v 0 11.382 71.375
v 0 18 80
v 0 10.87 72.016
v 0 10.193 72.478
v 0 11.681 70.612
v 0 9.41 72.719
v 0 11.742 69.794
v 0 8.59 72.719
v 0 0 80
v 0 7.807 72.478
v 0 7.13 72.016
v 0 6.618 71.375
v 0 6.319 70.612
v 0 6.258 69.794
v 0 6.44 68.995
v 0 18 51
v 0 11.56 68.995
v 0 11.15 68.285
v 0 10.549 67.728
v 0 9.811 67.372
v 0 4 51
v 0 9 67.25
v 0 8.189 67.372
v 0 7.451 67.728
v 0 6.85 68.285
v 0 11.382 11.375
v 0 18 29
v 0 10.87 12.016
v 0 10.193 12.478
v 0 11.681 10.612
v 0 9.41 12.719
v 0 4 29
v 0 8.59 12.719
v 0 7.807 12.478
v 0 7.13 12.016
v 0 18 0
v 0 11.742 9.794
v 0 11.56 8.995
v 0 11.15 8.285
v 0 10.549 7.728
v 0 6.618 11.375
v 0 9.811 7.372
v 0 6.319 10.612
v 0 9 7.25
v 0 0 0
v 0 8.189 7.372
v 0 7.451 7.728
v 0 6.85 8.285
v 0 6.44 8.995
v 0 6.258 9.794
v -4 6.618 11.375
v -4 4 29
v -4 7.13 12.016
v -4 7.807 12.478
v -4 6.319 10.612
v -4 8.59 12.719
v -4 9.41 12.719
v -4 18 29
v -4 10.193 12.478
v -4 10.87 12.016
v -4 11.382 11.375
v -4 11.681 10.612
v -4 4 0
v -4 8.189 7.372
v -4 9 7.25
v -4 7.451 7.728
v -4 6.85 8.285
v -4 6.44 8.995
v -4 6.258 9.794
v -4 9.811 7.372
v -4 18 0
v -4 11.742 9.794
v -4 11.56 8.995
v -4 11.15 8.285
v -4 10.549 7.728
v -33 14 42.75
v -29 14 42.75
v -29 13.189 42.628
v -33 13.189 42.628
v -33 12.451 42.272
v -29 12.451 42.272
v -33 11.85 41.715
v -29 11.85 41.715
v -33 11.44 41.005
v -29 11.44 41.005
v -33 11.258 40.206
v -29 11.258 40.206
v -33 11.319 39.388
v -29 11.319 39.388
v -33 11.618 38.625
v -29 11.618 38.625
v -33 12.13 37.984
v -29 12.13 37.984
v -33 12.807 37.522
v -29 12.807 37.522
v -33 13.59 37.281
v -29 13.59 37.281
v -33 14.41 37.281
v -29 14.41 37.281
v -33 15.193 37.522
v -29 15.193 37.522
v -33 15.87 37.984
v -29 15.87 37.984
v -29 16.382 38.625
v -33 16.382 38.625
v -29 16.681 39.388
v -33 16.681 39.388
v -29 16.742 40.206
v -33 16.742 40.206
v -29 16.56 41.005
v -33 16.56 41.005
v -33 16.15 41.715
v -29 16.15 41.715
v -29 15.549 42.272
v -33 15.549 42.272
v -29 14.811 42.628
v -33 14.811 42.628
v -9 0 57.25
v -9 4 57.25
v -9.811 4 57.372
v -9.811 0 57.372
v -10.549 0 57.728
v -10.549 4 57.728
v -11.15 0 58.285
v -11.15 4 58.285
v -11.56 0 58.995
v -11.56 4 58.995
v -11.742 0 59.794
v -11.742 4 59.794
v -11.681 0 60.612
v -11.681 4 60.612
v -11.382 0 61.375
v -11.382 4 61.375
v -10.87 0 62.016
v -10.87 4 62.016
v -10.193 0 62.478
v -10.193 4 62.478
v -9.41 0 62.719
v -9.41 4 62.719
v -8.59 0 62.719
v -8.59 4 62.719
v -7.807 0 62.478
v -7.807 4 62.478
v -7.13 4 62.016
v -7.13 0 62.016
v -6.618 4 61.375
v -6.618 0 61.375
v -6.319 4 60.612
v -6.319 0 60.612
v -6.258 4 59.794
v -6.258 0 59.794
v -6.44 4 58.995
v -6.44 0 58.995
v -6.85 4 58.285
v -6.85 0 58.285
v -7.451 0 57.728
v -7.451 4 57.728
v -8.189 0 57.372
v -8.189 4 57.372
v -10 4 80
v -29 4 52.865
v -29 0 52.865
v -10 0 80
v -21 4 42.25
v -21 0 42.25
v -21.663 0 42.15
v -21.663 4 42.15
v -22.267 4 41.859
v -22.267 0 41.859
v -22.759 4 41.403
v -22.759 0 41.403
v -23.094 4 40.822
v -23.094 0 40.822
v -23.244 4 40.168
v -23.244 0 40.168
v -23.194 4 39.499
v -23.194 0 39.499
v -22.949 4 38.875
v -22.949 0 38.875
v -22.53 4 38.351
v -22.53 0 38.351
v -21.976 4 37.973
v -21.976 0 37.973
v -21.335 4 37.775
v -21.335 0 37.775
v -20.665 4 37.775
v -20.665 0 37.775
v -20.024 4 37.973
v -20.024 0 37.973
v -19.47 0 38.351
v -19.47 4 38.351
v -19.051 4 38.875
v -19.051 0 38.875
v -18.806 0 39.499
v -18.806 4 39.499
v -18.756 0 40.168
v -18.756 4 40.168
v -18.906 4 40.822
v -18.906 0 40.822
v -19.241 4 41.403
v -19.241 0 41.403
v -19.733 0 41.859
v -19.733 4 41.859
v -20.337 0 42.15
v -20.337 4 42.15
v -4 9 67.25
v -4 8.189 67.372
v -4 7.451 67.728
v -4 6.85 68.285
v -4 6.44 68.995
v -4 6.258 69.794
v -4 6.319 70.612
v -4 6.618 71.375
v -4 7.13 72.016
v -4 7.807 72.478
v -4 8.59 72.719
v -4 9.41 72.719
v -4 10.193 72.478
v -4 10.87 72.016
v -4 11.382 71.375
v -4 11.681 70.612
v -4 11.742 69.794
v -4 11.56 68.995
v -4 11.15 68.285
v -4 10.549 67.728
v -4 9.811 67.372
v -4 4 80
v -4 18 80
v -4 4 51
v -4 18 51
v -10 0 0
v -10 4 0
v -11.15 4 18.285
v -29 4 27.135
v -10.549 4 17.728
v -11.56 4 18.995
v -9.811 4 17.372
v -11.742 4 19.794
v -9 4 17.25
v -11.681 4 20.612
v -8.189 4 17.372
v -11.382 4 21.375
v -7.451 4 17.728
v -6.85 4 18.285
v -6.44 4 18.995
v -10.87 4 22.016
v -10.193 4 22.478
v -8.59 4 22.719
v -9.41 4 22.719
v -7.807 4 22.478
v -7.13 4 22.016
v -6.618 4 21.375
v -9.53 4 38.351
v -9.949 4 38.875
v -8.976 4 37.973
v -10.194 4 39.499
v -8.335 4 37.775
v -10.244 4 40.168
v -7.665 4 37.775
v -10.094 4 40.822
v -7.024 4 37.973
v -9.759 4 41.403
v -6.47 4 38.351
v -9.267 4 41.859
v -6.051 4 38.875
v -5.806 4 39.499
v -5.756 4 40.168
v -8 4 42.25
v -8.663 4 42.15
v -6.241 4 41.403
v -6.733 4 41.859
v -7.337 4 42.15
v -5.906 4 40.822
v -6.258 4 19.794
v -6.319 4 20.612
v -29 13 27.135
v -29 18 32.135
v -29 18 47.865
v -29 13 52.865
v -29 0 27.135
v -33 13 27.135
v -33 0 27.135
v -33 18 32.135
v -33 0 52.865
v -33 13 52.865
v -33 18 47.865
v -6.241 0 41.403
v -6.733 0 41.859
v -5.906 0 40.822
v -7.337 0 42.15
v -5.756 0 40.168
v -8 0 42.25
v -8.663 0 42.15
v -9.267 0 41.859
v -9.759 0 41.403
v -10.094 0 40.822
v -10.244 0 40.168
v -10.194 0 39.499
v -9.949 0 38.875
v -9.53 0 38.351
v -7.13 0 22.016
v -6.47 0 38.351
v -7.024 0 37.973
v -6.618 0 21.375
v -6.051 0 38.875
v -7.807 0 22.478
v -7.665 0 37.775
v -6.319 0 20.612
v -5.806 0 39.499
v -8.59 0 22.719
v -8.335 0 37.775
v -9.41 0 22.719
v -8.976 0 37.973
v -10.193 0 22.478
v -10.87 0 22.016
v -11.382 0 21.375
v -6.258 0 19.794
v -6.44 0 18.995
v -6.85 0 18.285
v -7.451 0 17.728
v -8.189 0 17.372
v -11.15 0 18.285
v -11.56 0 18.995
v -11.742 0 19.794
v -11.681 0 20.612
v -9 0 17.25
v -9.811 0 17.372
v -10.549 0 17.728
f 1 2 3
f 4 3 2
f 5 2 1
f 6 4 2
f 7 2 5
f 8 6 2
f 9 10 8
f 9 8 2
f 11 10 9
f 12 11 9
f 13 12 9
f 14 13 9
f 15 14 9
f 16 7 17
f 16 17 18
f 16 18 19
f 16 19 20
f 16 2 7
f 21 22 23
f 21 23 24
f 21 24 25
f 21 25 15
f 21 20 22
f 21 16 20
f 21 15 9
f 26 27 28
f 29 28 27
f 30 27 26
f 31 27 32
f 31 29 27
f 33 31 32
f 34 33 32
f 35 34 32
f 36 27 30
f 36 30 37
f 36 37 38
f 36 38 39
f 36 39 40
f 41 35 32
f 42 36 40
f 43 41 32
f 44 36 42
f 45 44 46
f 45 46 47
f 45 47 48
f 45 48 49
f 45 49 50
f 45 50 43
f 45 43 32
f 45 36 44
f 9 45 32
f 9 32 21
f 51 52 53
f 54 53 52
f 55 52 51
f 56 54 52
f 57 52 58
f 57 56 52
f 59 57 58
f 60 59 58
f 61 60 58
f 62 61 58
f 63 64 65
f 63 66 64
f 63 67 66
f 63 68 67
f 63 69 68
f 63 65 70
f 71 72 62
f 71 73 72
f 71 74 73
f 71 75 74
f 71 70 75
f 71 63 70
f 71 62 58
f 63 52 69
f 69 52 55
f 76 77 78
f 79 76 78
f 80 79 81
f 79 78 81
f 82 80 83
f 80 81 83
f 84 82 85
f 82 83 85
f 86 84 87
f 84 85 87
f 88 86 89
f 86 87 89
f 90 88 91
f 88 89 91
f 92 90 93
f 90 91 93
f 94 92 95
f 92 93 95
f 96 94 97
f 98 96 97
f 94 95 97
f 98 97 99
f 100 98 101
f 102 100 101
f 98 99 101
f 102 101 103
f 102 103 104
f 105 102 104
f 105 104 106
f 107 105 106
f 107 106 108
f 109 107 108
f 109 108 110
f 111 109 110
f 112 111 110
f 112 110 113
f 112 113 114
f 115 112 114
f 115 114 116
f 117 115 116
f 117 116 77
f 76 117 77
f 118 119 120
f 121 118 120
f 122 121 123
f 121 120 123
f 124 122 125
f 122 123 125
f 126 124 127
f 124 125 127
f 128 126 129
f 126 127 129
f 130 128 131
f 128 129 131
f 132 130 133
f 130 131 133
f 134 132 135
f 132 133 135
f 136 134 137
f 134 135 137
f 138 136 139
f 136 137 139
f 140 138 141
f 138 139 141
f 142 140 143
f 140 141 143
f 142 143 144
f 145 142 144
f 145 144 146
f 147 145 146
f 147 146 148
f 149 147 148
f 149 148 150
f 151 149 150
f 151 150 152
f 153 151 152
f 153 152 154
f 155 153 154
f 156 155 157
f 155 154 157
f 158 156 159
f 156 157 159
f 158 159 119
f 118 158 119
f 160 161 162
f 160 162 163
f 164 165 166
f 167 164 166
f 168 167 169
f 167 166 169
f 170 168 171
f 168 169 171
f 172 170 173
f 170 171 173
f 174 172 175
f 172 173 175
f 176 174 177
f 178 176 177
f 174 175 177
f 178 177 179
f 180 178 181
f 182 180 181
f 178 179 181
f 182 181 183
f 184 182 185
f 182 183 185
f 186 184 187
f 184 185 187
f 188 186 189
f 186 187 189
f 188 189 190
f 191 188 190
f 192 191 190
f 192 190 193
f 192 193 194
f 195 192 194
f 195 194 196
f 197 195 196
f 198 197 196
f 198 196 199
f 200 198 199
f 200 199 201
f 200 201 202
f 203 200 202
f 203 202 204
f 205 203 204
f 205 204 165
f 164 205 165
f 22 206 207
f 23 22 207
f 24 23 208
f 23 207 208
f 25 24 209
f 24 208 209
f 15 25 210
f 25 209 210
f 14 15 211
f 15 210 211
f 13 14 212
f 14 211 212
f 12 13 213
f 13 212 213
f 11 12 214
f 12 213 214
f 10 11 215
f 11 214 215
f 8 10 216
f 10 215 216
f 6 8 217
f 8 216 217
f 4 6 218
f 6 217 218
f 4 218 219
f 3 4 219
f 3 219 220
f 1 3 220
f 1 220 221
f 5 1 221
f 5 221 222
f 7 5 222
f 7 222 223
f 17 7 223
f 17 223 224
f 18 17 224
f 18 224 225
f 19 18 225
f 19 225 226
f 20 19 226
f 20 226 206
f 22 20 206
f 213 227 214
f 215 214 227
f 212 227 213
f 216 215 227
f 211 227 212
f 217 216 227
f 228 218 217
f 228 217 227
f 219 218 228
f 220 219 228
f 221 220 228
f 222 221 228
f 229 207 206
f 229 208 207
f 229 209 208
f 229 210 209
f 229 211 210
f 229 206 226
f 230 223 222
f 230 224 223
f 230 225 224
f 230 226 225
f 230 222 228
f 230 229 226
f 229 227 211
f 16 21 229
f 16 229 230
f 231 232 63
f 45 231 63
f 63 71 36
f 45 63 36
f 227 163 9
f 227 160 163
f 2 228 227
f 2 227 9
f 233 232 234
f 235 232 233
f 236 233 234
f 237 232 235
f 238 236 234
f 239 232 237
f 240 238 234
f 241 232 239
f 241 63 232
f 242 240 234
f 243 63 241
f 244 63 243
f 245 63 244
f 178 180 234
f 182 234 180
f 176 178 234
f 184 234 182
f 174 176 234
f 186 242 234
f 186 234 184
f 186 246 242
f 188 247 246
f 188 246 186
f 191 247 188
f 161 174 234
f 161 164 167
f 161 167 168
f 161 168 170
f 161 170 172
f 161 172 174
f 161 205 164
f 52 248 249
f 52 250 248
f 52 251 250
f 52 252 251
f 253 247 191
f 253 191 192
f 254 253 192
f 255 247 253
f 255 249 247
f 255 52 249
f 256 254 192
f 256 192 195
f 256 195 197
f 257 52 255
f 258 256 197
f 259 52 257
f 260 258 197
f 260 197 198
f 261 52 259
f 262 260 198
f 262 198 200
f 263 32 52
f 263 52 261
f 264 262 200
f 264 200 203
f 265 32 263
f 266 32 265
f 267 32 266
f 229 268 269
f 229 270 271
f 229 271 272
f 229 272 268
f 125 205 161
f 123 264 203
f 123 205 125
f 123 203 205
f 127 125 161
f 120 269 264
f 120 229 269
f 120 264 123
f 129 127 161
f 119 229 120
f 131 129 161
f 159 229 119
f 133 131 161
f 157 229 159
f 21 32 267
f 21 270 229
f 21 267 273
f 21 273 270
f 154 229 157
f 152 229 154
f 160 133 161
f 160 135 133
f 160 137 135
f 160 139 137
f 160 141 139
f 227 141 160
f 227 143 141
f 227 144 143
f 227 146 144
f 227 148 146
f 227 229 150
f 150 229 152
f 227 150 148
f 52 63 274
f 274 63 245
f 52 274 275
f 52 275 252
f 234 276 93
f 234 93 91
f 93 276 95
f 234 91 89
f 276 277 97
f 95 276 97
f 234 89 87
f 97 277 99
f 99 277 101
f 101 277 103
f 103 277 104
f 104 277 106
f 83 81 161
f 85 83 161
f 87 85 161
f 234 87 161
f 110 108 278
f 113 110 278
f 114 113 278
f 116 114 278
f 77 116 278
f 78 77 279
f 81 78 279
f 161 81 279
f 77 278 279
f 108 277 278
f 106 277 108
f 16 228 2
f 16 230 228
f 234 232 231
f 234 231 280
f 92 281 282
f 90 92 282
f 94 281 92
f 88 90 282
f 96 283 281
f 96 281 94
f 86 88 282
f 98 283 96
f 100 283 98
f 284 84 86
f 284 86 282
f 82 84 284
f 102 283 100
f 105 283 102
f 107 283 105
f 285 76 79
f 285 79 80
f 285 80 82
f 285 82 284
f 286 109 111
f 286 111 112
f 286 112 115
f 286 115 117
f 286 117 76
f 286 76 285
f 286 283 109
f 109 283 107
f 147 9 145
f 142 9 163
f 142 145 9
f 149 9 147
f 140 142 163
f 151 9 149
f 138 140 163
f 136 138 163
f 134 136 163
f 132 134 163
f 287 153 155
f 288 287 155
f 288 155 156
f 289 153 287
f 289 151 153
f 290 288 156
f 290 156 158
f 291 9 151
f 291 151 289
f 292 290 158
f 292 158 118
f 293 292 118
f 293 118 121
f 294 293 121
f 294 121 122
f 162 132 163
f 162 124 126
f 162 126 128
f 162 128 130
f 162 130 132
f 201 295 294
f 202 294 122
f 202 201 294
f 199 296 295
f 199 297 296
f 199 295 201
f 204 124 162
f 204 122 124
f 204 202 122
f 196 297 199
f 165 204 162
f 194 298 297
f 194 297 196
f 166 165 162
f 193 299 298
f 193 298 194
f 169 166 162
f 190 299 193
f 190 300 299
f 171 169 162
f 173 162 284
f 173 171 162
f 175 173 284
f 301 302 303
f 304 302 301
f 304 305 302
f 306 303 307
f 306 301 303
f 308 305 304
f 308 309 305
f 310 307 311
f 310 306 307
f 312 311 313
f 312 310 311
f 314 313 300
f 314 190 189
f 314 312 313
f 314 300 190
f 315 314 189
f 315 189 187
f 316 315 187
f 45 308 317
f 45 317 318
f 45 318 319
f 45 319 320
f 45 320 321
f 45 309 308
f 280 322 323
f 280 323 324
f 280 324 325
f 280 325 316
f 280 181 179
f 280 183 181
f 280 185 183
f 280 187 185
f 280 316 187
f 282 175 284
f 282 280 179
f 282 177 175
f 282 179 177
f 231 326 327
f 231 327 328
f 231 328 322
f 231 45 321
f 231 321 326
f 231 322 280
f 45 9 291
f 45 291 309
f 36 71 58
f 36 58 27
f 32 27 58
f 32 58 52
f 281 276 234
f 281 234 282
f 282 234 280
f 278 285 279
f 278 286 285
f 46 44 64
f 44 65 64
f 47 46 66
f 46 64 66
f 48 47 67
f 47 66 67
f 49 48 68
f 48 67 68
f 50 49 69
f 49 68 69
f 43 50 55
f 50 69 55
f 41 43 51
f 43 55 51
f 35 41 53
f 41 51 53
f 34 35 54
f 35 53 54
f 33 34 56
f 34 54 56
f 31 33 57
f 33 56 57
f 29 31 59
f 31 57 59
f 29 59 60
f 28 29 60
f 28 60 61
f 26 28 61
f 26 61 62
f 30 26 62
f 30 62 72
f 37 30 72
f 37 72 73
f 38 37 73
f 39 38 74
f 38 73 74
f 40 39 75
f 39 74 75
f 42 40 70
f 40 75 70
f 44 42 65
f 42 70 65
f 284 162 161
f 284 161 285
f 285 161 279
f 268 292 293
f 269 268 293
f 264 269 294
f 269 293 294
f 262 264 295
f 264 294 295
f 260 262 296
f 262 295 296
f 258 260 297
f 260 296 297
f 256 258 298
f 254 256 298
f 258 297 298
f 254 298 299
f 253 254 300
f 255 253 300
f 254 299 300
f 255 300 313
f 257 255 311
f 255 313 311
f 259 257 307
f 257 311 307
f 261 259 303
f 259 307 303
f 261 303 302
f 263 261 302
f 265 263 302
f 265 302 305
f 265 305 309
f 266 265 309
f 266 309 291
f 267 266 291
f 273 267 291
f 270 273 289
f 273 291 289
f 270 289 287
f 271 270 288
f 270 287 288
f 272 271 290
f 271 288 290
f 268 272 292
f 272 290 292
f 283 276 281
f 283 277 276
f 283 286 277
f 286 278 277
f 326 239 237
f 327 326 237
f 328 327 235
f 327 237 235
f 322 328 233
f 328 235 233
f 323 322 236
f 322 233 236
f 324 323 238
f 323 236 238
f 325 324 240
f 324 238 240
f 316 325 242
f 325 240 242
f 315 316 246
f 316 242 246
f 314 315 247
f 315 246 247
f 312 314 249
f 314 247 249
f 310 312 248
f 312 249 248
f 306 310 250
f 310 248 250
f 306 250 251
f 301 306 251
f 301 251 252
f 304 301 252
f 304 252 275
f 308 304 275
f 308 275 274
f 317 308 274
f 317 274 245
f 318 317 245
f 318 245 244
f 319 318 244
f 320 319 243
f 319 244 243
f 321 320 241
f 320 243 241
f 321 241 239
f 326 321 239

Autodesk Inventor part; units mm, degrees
ref_plane "YZ Plane" through (0, 0, 0) normal (1, 0, 0) x (0, 1, 0)
ref_plane "XZ Plane" through (0, 0, 0) normal (0, 1, 0) x (-1, 0, 0)
ref_plane "XY Plane" through (0, 0, 0) normal (0, 0, 1) x (1, 0, 0)
sketch "Sketch1" plane through (0, 0, 0) normal (0, 0, 1) x (1, 0, 0)
  line L0 (0, 0) -> (-29, 0)
  line L1 (-29, 0) -> (-29, 4)
  line L2 (-29, 4) -> (-4, 4)
  line L3 (-4, 4) -> (-4, 18)
  line L4 (-4, 18) -> (0, 18)
  line L5 (0, 18) -> (0, 0)
  dimension "d0" = 4
  dimension "d1" = 4
  dimension "d2" = 29
  dimension "d3" = 18
extrude "Extrusion1" add sketch "Sketch1" along normal blind 80
sketch "Sketch2" plane through (0, 0, 0) normal (1, 0, 0) x (0, 0, -1)
  line L0 (0, 4) -> (-80, 4) projected
  line L1 (-51, 18) -> (-29, 18)
  line L2 (-29, 18) -> (-29, 4)
  line L3 (-29, 4) -> (-51, 4)
  line L4 (-51, 4) -> (-51, 18)
  line L5 (0, 18) -> (-80, 18) projected
  point P0 (0, 0)
  point P1 (-40, 18)
  point P2 (-40, 4)
  point P3 (-51, 4)
  dimension "d6" = 22
extrude "Extrusion2" cut sketch "Sketch2" against normal through all
sketch "Sketch3" plane through (0, 0, 0) normal (1, 0, 0) x (0, 0, -1)
  line L0 (0, 0) -> (-80, 0) projected
  line L1 (-80, 0) -> (-80, 18) projected
  line L2 (0, 0) -> (0, 18) projected
  point P0 (-70, 9)
  point P1 (-10, 9)
  dimension "d9" = 9
  dimension "d10" = 10
  dimension "d11" = 10
hole "Hole1" at (0, 9, 70) at (0, 9, 10) direction (-1, 0, 0) diameter 5.5 end through all
sketch "Sketch4" plane through (-29, 0, 0) normal (0, -1, 0) x (1, 0, 0)
  line L0 (29, 0) -> (29, 80) projected
  line L1 (0, 0) -> (29, 0) projected
  point P0 (20, 60)
  point P1 (20, 20)
  dimension "d19" = 9
  dimension "d20" = 20
  dimension "d21" = 20
hole "Hole2" at (-9, 0, 60) at (-9, 0, 20) direction (0, 1, 0) diameter 5.5 end through all
sketch "Sketch5" plane through (-29, 4, 0) normal (0, 1, 0) x (1, 0, 0)
  line L0 (0, 0) -> (0, -80) projected
  line L1 (0, -52.8652) -> (19, -80)
  line L2 (25, -80) -> (0, -80) projected
  line L3 (25, 0) -> (0, 0) projected
  line L4 (19, 0) -> (0, -27.1348)
  line L5 (25, -29) -> (29, -29) projected
  line L6 (29, -51) -> (25, -51) projected
  line L7 (29, -51) -> (29, -80) projected
  line L8 (29, 0) -> (29, -29) projected
  dimension "d29" = 10
  dimension "d30" = 10
  dimension "d31" = 55
  dimension "d32" = 55
extrude "Extrusion3" cut sketch "Sketch5" against normal through all
sketch "Sketch6" plane through (-4, 4, 51) normal (0, 1, 0) x (1, 0, 0)
  line L0 (4, 22) -> (4, 0) projected
  line L1 (-25, 23.8652) -> (-25, -1.8652) projected
  point P0 (4, 51)
  point P1 (-4, 11)
  point P2 (-17, 11)
  point P3 (-25, 11)
  dimension "d35" = 8
  dimension "d36" = 8
hole "Hole3" at (-8, 4, 40) at (-21, 4, 40) direction (0, -1, 0) diameter 4.5 end through all
sketch "Sketch7" plane through (-29, 0, 27.1348) normal (-1, 0, 0) x (0, 0, 1)
  line L0 (0, 4) -> (0, 0) projected
  line L1 (0, 0) -> (25.7304, 0) projected
  line L2 (25.7304, 0) -> (25.7304, 4) projected
  line L3 (0, 4) -> (25.7304, 4) projected
  line L4 (0, 0) -> (25.7304, 0)
  line L5 (25.7304, 0) -> (25.7304, 18)
  line L6 (25.7304, 18) -> (0, 18)
  line L7 (0, 18) -> (0, 0)
  line L8 (25.7304, 0) -> (25.7304, 4) projected
  line L9 (-27.1348, 18) -> (1.8652, 18) projected
  point P0 (-27.1348, 0)
extrude "Extrusion4" add sketch "Sketch7" along normal blind 4
sketch "Sketch8" plane through (-33, 0, 27.1348) normal (-1, 0, 0) x (0, 0, 1)
  line L0 (25.7304, 18) -> (0, 18) projected
  line L1 (-27.1348, 4) -> (0, 4) projected
  point P0 (-27.1348, 0)
  point P1 (12.8652, 14)
  point P2 (12.8652, 18)
  dimension "d46" = 10
hole "Hole4" at (-33, 14, 40) direction (1, 0, 0) diameter 5.5 end through all
chamfer "Chamfer1" distance 5 angle 45 2 edges at (-31, 18, 27.1348) (-31, 18, 52.8652)
equation "\"d11\" = d10"
equation "\"d21\" = d20"
equation "\"d30\" = d29"
equation "\"d32\" = d31"
equation "\"d36\" = d35"
